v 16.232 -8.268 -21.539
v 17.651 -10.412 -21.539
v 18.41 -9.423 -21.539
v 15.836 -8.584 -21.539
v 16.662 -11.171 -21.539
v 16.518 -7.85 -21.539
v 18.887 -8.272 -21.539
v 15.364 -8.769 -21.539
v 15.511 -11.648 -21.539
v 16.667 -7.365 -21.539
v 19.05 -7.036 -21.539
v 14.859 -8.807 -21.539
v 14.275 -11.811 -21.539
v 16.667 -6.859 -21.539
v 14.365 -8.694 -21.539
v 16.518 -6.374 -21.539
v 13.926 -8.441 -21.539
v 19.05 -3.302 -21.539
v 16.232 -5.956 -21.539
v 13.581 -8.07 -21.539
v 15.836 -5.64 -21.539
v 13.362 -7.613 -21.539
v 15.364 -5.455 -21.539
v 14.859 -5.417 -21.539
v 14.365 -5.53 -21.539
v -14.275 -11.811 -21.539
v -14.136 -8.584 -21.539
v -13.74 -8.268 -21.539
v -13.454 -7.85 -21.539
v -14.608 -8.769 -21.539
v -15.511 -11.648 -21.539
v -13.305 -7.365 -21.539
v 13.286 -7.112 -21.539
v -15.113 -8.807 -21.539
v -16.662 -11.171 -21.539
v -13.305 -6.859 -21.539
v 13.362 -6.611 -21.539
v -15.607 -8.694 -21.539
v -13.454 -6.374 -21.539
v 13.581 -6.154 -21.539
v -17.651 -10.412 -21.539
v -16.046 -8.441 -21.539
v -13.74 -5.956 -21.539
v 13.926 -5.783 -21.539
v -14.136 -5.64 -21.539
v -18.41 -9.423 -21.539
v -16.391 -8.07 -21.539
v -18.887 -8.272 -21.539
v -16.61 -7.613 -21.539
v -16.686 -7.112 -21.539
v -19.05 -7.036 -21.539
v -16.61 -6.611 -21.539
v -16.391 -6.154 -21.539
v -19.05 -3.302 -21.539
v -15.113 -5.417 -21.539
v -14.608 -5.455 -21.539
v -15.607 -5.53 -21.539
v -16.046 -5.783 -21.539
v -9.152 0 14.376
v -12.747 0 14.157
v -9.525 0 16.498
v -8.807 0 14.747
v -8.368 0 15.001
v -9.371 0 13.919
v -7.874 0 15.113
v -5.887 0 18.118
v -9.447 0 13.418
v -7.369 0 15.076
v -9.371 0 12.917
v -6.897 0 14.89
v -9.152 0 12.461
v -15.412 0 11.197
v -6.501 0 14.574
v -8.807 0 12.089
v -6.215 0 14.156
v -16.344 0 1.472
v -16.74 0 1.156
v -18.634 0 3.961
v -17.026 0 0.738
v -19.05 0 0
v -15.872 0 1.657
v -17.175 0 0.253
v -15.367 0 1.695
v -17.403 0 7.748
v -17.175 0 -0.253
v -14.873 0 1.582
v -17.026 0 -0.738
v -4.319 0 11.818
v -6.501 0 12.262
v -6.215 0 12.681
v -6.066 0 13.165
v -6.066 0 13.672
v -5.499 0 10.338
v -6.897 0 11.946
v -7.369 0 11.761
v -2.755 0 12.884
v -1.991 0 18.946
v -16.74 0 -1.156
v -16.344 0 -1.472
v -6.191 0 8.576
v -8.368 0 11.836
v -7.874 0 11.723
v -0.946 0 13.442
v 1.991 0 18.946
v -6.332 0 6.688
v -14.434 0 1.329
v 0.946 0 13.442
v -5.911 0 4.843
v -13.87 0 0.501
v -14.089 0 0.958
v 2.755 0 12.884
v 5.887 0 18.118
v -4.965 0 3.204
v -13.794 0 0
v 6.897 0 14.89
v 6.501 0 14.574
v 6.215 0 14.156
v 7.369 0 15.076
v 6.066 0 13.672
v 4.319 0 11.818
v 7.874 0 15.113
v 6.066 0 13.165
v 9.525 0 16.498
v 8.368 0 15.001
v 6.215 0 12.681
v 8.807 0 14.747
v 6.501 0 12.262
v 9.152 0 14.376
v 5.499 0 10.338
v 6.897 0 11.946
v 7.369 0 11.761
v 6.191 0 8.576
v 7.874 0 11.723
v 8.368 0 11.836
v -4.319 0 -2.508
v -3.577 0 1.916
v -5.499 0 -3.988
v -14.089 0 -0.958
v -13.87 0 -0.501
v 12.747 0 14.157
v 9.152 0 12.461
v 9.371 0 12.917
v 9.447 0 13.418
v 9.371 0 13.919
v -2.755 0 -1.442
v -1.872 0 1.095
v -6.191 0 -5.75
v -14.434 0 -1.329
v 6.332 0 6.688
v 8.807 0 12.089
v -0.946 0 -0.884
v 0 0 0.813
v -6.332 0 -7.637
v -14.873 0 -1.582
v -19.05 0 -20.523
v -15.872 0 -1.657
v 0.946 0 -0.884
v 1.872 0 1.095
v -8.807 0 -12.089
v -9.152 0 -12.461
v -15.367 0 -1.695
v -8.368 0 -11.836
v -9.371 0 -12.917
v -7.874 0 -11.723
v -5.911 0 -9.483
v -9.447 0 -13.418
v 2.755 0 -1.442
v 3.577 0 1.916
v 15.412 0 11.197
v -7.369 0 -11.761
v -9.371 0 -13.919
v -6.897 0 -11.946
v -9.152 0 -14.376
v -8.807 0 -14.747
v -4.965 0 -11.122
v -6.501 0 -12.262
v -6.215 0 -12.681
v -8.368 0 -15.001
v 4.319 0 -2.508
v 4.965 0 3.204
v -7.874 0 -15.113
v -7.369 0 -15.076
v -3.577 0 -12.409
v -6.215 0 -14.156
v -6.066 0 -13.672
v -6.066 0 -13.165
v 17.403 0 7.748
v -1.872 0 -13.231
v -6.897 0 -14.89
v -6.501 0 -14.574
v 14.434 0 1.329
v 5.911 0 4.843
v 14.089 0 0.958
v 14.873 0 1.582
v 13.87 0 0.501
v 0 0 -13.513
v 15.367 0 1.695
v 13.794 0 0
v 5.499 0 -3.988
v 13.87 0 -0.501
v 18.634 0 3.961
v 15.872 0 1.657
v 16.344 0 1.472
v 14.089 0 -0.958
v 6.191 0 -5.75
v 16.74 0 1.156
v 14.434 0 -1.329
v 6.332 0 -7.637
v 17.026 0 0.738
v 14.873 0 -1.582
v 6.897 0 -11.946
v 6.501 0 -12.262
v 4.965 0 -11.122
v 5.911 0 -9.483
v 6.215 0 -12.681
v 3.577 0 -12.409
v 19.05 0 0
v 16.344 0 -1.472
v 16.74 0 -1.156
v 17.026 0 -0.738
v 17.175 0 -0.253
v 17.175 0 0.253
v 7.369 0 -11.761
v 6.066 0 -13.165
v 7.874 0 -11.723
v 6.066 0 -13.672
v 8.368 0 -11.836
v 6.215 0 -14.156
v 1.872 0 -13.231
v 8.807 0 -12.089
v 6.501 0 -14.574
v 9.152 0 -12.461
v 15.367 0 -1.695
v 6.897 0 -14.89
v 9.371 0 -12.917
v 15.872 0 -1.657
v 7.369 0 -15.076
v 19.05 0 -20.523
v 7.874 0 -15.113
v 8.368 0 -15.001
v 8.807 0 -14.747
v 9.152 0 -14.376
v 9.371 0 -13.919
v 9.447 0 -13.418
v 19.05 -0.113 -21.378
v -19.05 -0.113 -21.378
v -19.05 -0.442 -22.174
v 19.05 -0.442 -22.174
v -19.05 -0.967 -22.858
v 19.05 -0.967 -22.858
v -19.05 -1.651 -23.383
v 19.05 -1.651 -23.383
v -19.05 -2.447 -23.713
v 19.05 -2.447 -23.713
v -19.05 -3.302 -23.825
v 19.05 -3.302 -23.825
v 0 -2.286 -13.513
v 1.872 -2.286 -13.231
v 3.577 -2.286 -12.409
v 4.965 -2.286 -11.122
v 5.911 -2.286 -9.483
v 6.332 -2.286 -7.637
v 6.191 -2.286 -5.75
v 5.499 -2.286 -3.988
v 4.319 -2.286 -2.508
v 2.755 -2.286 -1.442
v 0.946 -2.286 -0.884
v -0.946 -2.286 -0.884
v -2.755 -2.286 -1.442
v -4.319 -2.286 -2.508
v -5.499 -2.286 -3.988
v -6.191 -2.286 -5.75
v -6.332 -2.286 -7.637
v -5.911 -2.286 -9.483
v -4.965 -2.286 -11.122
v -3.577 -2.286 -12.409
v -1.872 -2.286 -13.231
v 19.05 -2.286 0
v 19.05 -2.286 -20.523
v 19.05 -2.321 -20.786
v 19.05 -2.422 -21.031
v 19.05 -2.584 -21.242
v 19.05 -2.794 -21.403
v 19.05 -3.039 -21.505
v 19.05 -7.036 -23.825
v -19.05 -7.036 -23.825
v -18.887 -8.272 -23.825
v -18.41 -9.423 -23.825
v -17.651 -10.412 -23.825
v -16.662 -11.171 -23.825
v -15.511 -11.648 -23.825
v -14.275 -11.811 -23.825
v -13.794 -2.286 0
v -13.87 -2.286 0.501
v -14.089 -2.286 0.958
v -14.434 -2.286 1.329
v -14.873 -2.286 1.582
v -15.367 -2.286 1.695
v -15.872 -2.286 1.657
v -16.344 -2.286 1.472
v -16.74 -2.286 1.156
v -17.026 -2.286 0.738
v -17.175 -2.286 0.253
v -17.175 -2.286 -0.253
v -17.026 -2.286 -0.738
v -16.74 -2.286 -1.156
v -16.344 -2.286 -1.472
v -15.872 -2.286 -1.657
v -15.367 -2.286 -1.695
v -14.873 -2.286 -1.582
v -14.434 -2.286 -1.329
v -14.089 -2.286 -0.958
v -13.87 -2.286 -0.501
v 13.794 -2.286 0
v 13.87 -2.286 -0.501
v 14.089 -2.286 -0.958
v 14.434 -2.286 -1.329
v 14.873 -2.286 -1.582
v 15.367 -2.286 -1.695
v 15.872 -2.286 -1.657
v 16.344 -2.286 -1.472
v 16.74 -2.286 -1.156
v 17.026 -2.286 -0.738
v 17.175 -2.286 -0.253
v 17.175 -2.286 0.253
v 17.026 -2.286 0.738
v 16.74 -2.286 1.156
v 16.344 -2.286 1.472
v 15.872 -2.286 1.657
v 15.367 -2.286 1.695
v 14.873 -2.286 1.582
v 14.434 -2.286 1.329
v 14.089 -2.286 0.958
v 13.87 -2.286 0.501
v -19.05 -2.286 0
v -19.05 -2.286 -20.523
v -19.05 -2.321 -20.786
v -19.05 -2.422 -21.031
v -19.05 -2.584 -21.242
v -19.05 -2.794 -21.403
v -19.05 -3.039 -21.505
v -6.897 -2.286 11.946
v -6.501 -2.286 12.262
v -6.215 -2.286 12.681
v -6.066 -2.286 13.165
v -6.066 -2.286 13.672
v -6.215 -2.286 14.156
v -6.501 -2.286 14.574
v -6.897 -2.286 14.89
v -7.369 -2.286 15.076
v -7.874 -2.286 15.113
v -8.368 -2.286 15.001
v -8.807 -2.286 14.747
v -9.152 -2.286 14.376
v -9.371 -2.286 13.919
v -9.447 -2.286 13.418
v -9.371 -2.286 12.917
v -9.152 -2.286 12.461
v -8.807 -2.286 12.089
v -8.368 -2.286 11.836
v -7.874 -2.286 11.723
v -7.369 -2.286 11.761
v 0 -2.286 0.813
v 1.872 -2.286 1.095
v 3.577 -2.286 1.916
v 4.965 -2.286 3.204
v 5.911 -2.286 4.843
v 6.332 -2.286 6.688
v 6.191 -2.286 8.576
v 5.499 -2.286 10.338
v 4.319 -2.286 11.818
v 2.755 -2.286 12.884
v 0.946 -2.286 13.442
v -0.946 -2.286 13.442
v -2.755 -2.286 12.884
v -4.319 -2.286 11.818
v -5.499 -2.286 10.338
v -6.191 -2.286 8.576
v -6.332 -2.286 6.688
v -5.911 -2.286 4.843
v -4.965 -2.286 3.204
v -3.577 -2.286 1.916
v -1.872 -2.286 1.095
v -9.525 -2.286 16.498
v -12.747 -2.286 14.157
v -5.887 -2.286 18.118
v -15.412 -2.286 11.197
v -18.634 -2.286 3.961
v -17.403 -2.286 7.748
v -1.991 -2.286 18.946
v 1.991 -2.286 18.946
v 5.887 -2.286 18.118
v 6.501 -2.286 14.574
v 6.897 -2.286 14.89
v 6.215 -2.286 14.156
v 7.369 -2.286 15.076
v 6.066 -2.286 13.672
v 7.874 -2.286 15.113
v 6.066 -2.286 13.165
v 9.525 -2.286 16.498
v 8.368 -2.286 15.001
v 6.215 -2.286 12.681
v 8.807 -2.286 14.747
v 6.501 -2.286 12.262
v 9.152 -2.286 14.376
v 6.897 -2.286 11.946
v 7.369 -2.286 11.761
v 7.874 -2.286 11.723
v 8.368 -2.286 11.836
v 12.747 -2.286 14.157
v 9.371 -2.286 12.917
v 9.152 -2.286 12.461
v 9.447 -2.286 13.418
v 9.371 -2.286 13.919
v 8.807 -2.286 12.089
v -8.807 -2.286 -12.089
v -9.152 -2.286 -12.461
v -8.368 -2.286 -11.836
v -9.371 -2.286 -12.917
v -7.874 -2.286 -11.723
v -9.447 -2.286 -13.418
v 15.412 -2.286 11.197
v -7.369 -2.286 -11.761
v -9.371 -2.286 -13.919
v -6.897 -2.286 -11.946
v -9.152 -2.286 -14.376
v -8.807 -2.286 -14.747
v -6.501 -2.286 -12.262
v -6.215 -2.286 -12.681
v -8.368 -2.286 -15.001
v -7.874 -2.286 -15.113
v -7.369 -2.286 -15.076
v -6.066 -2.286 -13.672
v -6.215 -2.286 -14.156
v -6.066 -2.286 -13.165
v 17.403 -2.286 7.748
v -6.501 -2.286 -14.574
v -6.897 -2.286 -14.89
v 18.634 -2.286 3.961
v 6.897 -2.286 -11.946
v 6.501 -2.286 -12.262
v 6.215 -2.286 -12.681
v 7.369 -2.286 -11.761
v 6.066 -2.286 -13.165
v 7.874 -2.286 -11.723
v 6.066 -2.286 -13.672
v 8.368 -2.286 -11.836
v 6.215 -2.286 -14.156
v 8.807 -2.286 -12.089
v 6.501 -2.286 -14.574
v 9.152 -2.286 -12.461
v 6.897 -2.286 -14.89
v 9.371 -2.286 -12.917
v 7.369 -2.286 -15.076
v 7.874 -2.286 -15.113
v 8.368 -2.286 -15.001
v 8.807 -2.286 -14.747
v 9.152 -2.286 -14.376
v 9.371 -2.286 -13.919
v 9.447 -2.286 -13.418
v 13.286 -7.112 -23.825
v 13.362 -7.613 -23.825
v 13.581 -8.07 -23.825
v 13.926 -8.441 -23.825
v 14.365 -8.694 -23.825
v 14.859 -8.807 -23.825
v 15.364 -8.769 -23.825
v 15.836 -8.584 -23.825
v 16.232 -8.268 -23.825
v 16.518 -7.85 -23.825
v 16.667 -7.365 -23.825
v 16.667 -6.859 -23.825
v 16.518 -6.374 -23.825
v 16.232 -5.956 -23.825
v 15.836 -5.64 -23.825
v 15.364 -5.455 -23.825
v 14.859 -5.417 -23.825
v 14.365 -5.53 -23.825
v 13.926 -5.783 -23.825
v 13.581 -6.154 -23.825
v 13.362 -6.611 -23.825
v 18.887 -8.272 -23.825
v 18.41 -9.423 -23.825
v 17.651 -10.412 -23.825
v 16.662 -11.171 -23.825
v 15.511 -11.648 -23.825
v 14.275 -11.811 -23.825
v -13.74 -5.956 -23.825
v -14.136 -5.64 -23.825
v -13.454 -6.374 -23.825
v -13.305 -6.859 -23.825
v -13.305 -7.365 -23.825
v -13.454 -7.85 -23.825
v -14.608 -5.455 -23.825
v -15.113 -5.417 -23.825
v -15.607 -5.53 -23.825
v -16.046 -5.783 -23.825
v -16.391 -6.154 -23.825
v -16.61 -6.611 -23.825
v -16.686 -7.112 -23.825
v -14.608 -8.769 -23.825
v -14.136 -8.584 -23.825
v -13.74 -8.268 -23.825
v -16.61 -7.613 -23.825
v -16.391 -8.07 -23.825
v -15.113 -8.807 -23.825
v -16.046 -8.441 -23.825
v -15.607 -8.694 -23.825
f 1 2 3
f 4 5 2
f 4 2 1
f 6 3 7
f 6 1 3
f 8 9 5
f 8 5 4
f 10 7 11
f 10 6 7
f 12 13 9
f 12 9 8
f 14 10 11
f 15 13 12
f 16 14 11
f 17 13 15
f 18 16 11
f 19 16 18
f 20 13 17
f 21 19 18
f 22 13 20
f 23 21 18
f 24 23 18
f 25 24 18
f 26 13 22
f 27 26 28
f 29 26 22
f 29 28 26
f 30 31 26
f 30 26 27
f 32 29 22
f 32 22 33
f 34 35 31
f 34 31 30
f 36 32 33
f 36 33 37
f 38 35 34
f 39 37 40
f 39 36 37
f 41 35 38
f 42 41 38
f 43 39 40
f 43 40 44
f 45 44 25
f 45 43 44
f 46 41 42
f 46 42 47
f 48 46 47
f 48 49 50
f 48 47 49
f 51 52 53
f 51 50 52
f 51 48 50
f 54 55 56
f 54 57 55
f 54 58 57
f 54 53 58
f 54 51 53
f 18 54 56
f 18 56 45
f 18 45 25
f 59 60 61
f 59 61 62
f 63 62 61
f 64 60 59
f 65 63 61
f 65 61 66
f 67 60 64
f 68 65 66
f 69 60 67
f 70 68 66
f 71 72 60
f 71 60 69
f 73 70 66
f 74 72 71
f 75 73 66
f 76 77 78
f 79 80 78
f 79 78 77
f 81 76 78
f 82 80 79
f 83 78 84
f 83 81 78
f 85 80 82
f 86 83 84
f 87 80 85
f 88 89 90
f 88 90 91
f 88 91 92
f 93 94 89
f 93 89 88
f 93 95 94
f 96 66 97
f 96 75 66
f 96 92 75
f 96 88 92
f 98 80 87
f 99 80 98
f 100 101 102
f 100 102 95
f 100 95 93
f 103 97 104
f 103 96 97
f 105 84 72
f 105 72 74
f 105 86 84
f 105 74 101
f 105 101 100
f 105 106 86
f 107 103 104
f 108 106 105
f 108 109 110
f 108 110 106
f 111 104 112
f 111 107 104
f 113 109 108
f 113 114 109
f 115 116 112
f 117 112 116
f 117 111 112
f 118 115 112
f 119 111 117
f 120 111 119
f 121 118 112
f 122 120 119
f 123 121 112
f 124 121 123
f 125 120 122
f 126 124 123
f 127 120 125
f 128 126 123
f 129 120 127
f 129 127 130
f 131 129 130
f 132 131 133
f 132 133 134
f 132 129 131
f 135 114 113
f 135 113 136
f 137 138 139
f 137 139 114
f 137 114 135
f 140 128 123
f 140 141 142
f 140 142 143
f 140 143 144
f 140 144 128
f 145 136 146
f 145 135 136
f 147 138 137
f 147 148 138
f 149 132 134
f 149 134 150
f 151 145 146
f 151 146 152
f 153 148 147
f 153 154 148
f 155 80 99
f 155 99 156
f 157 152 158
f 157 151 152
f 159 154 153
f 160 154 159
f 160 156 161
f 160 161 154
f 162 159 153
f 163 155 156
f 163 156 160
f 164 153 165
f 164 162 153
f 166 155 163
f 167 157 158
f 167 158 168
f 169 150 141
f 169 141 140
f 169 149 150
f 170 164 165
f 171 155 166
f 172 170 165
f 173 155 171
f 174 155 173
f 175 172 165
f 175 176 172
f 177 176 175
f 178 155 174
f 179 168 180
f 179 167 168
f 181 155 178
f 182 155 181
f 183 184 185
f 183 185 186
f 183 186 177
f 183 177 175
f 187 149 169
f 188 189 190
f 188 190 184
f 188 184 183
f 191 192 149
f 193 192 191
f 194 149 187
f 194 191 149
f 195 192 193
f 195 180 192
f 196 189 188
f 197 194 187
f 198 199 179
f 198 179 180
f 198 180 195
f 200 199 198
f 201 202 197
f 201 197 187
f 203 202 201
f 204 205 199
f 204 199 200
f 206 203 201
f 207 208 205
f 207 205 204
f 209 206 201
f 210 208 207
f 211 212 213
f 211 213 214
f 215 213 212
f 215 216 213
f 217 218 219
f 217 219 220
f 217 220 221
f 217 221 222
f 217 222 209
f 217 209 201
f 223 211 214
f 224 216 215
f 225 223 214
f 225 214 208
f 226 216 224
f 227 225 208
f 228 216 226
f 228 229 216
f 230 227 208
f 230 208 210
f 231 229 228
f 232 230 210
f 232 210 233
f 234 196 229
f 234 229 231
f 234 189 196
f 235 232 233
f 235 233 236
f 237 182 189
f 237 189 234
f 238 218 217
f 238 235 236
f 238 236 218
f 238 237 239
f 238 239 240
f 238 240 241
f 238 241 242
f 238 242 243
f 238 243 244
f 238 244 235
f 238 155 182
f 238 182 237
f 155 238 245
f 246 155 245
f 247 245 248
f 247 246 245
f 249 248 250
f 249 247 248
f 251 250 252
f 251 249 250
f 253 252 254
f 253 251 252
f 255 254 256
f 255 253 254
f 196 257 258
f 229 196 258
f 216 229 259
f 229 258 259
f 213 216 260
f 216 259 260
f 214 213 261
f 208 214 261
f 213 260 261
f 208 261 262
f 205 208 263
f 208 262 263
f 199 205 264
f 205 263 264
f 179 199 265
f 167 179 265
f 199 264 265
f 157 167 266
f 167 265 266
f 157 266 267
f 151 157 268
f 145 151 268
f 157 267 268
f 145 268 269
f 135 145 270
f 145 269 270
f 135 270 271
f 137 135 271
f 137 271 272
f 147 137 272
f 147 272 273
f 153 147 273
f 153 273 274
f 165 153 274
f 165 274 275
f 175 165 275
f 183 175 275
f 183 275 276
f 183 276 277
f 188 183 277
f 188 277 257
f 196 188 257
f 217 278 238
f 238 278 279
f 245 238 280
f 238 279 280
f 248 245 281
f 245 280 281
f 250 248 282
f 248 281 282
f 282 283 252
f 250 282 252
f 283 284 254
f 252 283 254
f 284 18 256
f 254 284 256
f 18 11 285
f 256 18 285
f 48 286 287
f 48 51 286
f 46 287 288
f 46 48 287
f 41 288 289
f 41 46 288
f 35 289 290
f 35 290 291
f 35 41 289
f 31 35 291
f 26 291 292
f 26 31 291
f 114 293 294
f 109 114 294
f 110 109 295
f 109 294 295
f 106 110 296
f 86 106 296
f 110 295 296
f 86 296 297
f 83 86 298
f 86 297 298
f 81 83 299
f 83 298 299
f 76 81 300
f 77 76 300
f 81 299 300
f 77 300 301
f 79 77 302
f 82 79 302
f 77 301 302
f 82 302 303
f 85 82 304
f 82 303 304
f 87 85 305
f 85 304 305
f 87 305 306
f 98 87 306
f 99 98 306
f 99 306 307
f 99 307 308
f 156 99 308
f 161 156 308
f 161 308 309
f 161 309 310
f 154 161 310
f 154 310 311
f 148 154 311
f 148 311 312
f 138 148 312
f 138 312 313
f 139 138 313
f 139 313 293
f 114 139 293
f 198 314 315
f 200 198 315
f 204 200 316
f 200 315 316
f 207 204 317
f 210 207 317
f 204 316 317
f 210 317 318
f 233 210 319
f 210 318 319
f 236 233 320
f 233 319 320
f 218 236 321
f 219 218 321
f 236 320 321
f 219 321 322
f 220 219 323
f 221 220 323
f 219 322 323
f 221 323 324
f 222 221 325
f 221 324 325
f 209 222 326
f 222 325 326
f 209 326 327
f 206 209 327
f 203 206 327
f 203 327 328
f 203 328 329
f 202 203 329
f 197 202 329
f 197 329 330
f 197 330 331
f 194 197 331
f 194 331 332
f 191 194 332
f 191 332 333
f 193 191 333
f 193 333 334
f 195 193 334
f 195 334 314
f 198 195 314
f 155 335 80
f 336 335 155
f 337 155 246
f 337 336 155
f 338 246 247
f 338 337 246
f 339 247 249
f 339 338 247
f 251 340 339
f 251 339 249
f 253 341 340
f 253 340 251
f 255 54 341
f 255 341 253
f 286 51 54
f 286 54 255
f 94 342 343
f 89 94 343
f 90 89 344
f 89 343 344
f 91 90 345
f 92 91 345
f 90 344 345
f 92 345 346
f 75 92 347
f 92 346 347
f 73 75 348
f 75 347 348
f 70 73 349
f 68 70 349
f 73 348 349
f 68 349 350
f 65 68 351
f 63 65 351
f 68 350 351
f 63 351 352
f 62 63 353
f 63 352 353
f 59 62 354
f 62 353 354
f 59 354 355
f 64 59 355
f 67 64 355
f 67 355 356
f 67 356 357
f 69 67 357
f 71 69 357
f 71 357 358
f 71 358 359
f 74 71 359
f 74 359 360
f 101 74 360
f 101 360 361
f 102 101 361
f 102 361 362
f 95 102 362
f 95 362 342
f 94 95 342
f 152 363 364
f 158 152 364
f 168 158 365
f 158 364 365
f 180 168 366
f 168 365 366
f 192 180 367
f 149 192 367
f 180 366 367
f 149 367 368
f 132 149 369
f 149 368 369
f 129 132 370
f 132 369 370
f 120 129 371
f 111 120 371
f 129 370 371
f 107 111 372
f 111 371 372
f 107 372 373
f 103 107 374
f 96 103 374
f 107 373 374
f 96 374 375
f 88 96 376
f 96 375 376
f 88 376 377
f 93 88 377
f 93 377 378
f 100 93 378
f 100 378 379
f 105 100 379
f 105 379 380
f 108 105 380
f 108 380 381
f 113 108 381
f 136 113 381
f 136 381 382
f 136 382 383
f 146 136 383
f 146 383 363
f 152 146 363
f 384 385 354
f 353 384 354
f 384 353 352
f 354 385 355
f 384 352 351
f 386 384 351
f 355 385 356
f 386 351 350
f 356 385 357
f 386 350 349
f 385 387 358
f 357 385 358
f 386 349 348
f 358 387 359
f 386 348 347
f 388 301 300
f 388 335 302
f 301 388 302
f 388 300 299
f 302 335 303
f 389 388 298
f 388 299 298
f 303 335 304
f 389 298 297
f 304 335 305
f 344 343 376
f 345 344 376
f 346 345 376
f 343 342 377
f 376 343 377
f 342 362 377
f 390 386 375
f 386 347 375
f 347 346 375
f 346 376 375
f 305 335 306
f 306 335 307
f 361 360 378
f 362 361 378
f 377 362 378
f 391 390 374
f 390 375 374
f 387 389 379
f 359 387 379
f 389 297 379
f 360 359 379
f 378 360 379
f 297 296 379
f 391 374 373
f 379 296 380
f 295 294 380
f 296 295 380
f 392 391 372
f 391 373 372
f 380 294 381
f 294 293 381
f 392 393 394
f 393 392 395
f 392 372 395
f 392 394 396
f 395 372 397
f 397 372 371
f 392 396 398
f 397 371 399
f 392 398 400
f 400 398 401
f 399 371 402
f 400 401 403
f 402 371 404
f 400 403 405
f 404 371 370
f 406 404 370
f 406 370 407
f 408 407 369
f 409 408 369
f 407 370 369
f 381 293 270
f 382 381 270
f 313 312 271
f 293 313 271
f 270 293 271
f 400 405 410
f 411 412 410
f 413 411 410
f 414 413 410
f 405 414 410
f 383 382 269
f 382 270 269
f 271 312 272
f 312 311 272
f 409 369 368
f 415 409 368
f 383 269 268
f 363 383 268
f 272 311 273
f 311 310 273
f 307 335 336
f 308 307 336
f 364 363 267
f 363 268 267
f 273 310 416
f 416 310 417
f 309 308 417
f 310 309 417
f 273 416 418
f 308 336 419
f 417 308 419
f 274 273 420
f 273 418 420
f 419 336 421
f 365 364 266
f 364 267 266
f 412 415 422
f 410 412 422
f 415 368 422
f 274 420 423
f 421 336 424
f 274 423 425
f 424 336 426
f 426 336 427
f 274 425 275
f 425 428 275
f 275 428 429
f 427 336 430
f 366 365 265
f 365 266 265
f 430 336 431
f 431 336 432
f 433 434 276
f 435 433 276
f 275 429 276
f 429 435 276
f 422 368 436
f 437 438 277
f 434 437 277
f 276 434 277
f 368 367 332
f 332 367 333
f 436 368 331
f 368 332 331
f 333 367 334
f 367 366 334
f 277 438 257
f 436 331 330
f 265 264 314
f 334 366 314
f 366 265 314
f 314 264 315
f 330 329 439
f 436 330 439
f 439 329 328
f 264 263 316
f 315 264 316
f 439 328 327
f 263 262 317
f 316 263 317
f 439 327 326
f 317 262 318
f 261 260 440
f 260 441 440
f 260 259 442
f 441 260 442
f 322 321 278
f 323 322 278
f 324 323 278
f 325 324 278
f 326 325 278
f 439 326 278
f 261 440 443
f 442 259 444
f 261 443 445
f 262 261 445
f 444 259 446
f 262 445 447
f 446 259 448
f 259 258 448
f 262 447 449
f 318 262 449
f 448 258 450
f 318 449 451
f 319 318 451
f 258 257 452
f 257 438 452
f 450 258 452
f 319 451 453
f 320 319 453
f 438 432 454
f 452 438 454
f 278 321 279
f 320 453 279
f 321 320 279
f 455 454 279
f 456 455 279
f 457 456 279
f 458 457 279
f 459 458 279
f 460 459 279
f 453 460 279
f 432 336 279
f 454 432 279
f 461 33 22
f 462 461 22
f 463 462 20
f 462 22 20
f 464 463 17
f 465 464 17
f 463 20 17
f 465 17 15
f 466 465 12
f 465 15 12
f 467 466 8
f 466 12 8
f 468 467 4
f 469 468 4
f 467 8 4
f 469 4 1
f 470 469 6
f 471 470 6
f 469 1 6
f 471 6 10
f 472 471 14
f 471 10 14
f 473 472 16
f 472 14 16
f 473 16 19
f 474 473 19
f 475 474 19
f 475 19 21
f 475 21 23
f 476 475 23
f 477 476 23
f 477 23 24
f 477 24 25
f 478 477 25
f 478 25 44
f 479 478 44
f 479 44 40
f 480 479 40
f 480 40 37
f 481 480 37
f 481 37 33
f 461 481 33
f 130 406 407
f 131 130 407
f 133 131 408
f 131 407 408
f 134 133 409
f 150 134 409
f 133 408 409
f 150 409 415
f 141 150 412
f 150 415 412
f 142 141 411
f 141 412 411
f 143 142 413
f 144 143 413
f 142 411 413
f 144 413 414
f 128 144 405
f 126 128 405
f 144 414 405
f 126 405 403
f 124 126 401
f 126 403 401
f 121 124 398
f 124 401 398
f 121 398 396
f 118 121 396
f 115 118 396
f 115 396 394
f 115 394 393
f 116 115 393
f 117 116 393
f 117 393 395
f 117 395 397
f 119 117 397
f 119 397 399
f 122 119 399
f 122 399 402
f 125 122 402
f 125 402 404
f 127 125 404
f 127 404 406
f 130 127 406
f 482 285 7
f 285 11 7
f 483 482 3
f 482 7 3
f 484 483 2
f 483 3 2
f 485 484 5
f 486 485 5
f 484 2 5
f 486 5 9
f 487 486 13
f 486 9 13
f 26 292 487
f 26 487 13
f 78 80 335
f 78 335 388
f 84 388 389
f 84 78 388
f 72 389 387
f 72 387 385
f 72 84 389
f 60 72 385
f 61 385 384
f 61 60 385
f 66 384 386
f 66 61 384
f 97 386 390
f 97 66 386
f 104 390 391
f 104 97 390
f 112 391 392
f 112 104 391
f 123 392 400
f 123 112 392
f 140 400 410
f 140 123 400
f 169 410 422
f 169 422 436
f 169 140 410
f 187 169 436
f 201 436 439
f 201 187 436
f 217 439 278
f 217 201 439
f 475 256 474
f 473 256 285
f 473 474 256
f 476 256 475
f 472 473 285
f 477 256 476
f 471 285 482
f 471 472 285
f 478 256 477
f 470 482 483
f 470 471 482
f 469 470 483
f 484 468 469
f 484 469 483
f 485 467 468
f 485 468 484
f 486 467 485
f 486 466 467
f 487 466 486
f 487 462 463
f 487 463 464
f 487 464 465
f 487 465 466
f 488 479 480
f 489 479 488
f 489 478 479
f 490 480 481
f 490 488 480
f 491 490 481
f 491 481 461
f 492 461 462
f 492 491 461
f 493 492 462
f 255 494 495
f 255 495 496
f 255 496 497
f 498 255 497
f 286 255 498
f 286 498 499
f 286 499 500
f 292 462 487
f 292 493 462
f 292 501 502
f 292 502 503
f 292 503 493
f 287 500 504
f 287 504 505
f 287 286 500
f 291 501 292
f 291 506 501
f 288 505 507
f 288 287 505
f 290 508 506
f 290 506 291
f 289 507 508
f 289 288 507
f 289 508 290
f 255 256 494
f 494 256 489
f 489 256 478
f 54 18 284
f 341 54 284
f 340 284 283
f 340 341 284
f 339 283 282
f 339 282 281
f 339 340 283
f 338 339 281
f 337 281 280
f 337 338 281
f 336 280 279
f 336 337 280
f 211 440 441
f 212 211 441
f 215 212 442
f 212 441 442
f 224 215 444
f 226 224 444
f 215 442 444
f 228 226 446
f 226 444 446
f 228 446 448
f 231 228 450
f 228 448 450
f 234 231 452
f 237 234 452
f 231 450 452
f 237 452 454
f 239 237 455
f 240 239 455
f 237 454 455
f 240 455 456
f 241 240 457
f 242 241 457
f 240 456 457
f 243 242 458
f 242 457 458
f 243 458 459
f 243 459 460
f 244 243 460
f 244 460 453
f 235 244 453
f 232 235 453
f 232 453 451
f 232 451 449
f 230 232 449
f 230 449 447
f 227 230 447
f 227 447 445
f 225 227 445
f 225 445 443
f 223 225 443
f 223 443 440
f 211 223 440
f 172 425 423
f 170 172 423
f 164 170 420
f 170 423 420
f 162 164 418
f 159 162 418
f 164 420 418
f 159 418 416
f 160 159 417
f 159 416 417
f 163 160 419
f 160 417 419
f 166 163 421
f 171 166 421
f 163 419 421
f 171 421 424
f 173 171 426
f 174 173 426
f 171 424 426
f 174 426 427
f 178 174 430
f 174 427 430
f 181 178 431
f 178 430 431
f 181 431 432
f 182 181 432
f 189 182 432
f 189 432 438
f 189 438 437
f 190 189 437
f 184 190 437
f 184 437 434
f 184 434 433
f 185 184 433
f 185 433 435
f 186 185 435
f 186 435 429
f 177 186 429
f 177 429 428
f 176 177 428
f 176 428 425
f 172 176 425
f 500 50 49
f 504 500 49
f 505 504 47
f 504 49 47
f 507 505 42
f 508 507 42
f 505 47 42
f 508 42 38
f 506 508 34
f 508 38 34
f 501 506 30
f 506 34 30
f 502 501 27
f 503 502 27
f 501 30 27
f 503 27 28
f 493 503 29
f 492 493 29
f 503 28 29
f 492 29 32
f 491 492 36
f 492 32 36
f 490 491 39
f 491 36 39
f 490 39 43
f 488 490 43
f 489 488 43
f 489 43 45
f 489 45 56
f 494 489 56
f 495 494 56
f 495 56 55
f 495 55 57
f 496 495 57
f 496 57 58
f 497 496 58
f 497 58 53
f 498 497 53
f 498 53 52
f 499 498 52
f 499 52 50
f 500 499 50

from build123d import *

# Parameters (mm, degrees)
BASE_FLANGIA_DEPTH            = 2.286
BORDO_FLANGIA_STRIP_W         = 11.176
BORDO_FLANGIA_STRIP_H         = 2.286
BORDO_FLANGIA_STRIP_CUT_DEPTH = 38.1
BORDO_FLANGIA_DEPTH           = 38.1
FORO_PER_VITE_M3_1_D          = 3.4
RIPETIZIONECIRCOLARE1_COUNT   = 6
SCHIZZO7_R                    = 6.35
TAGLIO_ESTRUSIONE1_DEPTH      = 2.54
FORO_PER_VITE_M3_2_D          = 3.4
RACCORDO_R                    = 4.7752


# Sheet-metal steps are written as plain solids
with BuildPart() as part:
    # Schizzo1 → Base-Flangia (new body)
    with BuildSketch(Plane(origin=(0, 0, 0), x_dir=(1, 0, 0), z_dir=(0, 1, 0))):
        with BuildLine():
            Line((19.05, 0), (19.05, 23.8252))
            Line((19.05, 23.8252), (-19.05, 23.8252))
            Line((-19.05, 23.8252), (-19.05, 0))
            ThreePointArc((-19.05, 0), (0, -19.05), (19.05, 0))
        make_face()
    extrude(amount=-BASE_FLANGIA_DEPTH)

    # Bordo-Flangia strip (across the edge) → Bordo-Flangia strip cut (cut)
    with BuildSketch(Plane(origin=(-19.05, -2.286, -23.8252), x_dir=(0, 0, 1), z_dir=(1, 0, 0))):
        with Locations((-2.286, -1.143)):
            Rectangle(BORDO_FLANGIA_STRIP_W, BORDO_FLANGIA_STRIP_H)
    extrude(amount=BORDO_FLANGIA_STRIP_CUT_DEPTH, mode=Mode.SUBTRACT)

    # Bordo-Flangia section (across the edge) → Bordo-Flangia (add)
    with BuildSketch(Plane(origin=(-19.05, -2.286, -23.8252), x_dir=(0, 0, 1), z_dir=(1, 0, 0))):
        with BuildLine():
            Line((0, 1.016), (0, 9.525))
            Line((0, 9.525), (2.286, 9.525))
            Line((2.286, 9.525), (2.286, 1.016))
            ThreePointArc((2.286, 1.016), (2.58357951, 0.29757951), (3.302, 0))
            Line((3.302, 0), (3.302, -2.286))
            ThreePointArc((3.302, -2.286), (0.967133409, -1.318866591), (0, 1.016))
        make_face()
    extrude(amount=BORDO_FLANGIA_DEPTH)

    # Foro per Vite M3-1 (through all)
    with Locations(Plane(origin=(0, 0, 0), x_dir=(1, 0, 0), z_dir=(0, 1, 0))):
        with Locations((15.494, 0)):
            foro_per_vite_m3_1 = Hole(FORO_PER_VITE_M3_1_D / 2)

    # RipetizioneCircolare1: Foro per Vite M3-1 ×6 about axis
    ripetizionecircolare1_axis = Axis((0, 0, 0), (0, 1, 0))
    for i in range(1, RIPETIZIONECIRCOLARE1_COUNT):
        add(foro_per_vite_m3_1.rotate(ripetizionecircolare1_axis, i * 360 / RIPETIZIONECIRCOLARE1_COUNT), mode=Mode.SUBTRACT)

    # Schizzo7 → Taglio-Estrusione1 (cut)
    with BuildSketch(Plane.XZ.offset(2.286)):
        with Locations(Location((0, -7.1628, 0), (0, 0, 270))):
            Circle(SCHIZZO7_R)
        with Locations(Location((0, 7.1628, 0), (0, 0, 270))):
            Circle(SCHIZZO7_R)
    extrude(amount=-TAGLIO_ESTRUSIONE1_DEPTH, mode=Mode.SUBTRACT)

    # Foro per Vite M3-2 (through all)
    with Locations(Plane(origin=(0, 0, -23.8252), x_dir=(1, 0, 0), z_dir=(0, 0, -1))):
        with Locations((14.986, 7.112), (-14.986, 7.112)):
            Hole(FORO_PER_VITE_M3_2_D / 2)

    # Raccordo
    raccordo_edges = [part.edges().sort_by_distance(p)[0] for p in [
        (-19.05, -11.811, -22.6822),
        (19.05, -11.811, -22.6822),
    ]]
    fillet(raccordo_edges, radius=RACCORDO_R)


solid = part.part
